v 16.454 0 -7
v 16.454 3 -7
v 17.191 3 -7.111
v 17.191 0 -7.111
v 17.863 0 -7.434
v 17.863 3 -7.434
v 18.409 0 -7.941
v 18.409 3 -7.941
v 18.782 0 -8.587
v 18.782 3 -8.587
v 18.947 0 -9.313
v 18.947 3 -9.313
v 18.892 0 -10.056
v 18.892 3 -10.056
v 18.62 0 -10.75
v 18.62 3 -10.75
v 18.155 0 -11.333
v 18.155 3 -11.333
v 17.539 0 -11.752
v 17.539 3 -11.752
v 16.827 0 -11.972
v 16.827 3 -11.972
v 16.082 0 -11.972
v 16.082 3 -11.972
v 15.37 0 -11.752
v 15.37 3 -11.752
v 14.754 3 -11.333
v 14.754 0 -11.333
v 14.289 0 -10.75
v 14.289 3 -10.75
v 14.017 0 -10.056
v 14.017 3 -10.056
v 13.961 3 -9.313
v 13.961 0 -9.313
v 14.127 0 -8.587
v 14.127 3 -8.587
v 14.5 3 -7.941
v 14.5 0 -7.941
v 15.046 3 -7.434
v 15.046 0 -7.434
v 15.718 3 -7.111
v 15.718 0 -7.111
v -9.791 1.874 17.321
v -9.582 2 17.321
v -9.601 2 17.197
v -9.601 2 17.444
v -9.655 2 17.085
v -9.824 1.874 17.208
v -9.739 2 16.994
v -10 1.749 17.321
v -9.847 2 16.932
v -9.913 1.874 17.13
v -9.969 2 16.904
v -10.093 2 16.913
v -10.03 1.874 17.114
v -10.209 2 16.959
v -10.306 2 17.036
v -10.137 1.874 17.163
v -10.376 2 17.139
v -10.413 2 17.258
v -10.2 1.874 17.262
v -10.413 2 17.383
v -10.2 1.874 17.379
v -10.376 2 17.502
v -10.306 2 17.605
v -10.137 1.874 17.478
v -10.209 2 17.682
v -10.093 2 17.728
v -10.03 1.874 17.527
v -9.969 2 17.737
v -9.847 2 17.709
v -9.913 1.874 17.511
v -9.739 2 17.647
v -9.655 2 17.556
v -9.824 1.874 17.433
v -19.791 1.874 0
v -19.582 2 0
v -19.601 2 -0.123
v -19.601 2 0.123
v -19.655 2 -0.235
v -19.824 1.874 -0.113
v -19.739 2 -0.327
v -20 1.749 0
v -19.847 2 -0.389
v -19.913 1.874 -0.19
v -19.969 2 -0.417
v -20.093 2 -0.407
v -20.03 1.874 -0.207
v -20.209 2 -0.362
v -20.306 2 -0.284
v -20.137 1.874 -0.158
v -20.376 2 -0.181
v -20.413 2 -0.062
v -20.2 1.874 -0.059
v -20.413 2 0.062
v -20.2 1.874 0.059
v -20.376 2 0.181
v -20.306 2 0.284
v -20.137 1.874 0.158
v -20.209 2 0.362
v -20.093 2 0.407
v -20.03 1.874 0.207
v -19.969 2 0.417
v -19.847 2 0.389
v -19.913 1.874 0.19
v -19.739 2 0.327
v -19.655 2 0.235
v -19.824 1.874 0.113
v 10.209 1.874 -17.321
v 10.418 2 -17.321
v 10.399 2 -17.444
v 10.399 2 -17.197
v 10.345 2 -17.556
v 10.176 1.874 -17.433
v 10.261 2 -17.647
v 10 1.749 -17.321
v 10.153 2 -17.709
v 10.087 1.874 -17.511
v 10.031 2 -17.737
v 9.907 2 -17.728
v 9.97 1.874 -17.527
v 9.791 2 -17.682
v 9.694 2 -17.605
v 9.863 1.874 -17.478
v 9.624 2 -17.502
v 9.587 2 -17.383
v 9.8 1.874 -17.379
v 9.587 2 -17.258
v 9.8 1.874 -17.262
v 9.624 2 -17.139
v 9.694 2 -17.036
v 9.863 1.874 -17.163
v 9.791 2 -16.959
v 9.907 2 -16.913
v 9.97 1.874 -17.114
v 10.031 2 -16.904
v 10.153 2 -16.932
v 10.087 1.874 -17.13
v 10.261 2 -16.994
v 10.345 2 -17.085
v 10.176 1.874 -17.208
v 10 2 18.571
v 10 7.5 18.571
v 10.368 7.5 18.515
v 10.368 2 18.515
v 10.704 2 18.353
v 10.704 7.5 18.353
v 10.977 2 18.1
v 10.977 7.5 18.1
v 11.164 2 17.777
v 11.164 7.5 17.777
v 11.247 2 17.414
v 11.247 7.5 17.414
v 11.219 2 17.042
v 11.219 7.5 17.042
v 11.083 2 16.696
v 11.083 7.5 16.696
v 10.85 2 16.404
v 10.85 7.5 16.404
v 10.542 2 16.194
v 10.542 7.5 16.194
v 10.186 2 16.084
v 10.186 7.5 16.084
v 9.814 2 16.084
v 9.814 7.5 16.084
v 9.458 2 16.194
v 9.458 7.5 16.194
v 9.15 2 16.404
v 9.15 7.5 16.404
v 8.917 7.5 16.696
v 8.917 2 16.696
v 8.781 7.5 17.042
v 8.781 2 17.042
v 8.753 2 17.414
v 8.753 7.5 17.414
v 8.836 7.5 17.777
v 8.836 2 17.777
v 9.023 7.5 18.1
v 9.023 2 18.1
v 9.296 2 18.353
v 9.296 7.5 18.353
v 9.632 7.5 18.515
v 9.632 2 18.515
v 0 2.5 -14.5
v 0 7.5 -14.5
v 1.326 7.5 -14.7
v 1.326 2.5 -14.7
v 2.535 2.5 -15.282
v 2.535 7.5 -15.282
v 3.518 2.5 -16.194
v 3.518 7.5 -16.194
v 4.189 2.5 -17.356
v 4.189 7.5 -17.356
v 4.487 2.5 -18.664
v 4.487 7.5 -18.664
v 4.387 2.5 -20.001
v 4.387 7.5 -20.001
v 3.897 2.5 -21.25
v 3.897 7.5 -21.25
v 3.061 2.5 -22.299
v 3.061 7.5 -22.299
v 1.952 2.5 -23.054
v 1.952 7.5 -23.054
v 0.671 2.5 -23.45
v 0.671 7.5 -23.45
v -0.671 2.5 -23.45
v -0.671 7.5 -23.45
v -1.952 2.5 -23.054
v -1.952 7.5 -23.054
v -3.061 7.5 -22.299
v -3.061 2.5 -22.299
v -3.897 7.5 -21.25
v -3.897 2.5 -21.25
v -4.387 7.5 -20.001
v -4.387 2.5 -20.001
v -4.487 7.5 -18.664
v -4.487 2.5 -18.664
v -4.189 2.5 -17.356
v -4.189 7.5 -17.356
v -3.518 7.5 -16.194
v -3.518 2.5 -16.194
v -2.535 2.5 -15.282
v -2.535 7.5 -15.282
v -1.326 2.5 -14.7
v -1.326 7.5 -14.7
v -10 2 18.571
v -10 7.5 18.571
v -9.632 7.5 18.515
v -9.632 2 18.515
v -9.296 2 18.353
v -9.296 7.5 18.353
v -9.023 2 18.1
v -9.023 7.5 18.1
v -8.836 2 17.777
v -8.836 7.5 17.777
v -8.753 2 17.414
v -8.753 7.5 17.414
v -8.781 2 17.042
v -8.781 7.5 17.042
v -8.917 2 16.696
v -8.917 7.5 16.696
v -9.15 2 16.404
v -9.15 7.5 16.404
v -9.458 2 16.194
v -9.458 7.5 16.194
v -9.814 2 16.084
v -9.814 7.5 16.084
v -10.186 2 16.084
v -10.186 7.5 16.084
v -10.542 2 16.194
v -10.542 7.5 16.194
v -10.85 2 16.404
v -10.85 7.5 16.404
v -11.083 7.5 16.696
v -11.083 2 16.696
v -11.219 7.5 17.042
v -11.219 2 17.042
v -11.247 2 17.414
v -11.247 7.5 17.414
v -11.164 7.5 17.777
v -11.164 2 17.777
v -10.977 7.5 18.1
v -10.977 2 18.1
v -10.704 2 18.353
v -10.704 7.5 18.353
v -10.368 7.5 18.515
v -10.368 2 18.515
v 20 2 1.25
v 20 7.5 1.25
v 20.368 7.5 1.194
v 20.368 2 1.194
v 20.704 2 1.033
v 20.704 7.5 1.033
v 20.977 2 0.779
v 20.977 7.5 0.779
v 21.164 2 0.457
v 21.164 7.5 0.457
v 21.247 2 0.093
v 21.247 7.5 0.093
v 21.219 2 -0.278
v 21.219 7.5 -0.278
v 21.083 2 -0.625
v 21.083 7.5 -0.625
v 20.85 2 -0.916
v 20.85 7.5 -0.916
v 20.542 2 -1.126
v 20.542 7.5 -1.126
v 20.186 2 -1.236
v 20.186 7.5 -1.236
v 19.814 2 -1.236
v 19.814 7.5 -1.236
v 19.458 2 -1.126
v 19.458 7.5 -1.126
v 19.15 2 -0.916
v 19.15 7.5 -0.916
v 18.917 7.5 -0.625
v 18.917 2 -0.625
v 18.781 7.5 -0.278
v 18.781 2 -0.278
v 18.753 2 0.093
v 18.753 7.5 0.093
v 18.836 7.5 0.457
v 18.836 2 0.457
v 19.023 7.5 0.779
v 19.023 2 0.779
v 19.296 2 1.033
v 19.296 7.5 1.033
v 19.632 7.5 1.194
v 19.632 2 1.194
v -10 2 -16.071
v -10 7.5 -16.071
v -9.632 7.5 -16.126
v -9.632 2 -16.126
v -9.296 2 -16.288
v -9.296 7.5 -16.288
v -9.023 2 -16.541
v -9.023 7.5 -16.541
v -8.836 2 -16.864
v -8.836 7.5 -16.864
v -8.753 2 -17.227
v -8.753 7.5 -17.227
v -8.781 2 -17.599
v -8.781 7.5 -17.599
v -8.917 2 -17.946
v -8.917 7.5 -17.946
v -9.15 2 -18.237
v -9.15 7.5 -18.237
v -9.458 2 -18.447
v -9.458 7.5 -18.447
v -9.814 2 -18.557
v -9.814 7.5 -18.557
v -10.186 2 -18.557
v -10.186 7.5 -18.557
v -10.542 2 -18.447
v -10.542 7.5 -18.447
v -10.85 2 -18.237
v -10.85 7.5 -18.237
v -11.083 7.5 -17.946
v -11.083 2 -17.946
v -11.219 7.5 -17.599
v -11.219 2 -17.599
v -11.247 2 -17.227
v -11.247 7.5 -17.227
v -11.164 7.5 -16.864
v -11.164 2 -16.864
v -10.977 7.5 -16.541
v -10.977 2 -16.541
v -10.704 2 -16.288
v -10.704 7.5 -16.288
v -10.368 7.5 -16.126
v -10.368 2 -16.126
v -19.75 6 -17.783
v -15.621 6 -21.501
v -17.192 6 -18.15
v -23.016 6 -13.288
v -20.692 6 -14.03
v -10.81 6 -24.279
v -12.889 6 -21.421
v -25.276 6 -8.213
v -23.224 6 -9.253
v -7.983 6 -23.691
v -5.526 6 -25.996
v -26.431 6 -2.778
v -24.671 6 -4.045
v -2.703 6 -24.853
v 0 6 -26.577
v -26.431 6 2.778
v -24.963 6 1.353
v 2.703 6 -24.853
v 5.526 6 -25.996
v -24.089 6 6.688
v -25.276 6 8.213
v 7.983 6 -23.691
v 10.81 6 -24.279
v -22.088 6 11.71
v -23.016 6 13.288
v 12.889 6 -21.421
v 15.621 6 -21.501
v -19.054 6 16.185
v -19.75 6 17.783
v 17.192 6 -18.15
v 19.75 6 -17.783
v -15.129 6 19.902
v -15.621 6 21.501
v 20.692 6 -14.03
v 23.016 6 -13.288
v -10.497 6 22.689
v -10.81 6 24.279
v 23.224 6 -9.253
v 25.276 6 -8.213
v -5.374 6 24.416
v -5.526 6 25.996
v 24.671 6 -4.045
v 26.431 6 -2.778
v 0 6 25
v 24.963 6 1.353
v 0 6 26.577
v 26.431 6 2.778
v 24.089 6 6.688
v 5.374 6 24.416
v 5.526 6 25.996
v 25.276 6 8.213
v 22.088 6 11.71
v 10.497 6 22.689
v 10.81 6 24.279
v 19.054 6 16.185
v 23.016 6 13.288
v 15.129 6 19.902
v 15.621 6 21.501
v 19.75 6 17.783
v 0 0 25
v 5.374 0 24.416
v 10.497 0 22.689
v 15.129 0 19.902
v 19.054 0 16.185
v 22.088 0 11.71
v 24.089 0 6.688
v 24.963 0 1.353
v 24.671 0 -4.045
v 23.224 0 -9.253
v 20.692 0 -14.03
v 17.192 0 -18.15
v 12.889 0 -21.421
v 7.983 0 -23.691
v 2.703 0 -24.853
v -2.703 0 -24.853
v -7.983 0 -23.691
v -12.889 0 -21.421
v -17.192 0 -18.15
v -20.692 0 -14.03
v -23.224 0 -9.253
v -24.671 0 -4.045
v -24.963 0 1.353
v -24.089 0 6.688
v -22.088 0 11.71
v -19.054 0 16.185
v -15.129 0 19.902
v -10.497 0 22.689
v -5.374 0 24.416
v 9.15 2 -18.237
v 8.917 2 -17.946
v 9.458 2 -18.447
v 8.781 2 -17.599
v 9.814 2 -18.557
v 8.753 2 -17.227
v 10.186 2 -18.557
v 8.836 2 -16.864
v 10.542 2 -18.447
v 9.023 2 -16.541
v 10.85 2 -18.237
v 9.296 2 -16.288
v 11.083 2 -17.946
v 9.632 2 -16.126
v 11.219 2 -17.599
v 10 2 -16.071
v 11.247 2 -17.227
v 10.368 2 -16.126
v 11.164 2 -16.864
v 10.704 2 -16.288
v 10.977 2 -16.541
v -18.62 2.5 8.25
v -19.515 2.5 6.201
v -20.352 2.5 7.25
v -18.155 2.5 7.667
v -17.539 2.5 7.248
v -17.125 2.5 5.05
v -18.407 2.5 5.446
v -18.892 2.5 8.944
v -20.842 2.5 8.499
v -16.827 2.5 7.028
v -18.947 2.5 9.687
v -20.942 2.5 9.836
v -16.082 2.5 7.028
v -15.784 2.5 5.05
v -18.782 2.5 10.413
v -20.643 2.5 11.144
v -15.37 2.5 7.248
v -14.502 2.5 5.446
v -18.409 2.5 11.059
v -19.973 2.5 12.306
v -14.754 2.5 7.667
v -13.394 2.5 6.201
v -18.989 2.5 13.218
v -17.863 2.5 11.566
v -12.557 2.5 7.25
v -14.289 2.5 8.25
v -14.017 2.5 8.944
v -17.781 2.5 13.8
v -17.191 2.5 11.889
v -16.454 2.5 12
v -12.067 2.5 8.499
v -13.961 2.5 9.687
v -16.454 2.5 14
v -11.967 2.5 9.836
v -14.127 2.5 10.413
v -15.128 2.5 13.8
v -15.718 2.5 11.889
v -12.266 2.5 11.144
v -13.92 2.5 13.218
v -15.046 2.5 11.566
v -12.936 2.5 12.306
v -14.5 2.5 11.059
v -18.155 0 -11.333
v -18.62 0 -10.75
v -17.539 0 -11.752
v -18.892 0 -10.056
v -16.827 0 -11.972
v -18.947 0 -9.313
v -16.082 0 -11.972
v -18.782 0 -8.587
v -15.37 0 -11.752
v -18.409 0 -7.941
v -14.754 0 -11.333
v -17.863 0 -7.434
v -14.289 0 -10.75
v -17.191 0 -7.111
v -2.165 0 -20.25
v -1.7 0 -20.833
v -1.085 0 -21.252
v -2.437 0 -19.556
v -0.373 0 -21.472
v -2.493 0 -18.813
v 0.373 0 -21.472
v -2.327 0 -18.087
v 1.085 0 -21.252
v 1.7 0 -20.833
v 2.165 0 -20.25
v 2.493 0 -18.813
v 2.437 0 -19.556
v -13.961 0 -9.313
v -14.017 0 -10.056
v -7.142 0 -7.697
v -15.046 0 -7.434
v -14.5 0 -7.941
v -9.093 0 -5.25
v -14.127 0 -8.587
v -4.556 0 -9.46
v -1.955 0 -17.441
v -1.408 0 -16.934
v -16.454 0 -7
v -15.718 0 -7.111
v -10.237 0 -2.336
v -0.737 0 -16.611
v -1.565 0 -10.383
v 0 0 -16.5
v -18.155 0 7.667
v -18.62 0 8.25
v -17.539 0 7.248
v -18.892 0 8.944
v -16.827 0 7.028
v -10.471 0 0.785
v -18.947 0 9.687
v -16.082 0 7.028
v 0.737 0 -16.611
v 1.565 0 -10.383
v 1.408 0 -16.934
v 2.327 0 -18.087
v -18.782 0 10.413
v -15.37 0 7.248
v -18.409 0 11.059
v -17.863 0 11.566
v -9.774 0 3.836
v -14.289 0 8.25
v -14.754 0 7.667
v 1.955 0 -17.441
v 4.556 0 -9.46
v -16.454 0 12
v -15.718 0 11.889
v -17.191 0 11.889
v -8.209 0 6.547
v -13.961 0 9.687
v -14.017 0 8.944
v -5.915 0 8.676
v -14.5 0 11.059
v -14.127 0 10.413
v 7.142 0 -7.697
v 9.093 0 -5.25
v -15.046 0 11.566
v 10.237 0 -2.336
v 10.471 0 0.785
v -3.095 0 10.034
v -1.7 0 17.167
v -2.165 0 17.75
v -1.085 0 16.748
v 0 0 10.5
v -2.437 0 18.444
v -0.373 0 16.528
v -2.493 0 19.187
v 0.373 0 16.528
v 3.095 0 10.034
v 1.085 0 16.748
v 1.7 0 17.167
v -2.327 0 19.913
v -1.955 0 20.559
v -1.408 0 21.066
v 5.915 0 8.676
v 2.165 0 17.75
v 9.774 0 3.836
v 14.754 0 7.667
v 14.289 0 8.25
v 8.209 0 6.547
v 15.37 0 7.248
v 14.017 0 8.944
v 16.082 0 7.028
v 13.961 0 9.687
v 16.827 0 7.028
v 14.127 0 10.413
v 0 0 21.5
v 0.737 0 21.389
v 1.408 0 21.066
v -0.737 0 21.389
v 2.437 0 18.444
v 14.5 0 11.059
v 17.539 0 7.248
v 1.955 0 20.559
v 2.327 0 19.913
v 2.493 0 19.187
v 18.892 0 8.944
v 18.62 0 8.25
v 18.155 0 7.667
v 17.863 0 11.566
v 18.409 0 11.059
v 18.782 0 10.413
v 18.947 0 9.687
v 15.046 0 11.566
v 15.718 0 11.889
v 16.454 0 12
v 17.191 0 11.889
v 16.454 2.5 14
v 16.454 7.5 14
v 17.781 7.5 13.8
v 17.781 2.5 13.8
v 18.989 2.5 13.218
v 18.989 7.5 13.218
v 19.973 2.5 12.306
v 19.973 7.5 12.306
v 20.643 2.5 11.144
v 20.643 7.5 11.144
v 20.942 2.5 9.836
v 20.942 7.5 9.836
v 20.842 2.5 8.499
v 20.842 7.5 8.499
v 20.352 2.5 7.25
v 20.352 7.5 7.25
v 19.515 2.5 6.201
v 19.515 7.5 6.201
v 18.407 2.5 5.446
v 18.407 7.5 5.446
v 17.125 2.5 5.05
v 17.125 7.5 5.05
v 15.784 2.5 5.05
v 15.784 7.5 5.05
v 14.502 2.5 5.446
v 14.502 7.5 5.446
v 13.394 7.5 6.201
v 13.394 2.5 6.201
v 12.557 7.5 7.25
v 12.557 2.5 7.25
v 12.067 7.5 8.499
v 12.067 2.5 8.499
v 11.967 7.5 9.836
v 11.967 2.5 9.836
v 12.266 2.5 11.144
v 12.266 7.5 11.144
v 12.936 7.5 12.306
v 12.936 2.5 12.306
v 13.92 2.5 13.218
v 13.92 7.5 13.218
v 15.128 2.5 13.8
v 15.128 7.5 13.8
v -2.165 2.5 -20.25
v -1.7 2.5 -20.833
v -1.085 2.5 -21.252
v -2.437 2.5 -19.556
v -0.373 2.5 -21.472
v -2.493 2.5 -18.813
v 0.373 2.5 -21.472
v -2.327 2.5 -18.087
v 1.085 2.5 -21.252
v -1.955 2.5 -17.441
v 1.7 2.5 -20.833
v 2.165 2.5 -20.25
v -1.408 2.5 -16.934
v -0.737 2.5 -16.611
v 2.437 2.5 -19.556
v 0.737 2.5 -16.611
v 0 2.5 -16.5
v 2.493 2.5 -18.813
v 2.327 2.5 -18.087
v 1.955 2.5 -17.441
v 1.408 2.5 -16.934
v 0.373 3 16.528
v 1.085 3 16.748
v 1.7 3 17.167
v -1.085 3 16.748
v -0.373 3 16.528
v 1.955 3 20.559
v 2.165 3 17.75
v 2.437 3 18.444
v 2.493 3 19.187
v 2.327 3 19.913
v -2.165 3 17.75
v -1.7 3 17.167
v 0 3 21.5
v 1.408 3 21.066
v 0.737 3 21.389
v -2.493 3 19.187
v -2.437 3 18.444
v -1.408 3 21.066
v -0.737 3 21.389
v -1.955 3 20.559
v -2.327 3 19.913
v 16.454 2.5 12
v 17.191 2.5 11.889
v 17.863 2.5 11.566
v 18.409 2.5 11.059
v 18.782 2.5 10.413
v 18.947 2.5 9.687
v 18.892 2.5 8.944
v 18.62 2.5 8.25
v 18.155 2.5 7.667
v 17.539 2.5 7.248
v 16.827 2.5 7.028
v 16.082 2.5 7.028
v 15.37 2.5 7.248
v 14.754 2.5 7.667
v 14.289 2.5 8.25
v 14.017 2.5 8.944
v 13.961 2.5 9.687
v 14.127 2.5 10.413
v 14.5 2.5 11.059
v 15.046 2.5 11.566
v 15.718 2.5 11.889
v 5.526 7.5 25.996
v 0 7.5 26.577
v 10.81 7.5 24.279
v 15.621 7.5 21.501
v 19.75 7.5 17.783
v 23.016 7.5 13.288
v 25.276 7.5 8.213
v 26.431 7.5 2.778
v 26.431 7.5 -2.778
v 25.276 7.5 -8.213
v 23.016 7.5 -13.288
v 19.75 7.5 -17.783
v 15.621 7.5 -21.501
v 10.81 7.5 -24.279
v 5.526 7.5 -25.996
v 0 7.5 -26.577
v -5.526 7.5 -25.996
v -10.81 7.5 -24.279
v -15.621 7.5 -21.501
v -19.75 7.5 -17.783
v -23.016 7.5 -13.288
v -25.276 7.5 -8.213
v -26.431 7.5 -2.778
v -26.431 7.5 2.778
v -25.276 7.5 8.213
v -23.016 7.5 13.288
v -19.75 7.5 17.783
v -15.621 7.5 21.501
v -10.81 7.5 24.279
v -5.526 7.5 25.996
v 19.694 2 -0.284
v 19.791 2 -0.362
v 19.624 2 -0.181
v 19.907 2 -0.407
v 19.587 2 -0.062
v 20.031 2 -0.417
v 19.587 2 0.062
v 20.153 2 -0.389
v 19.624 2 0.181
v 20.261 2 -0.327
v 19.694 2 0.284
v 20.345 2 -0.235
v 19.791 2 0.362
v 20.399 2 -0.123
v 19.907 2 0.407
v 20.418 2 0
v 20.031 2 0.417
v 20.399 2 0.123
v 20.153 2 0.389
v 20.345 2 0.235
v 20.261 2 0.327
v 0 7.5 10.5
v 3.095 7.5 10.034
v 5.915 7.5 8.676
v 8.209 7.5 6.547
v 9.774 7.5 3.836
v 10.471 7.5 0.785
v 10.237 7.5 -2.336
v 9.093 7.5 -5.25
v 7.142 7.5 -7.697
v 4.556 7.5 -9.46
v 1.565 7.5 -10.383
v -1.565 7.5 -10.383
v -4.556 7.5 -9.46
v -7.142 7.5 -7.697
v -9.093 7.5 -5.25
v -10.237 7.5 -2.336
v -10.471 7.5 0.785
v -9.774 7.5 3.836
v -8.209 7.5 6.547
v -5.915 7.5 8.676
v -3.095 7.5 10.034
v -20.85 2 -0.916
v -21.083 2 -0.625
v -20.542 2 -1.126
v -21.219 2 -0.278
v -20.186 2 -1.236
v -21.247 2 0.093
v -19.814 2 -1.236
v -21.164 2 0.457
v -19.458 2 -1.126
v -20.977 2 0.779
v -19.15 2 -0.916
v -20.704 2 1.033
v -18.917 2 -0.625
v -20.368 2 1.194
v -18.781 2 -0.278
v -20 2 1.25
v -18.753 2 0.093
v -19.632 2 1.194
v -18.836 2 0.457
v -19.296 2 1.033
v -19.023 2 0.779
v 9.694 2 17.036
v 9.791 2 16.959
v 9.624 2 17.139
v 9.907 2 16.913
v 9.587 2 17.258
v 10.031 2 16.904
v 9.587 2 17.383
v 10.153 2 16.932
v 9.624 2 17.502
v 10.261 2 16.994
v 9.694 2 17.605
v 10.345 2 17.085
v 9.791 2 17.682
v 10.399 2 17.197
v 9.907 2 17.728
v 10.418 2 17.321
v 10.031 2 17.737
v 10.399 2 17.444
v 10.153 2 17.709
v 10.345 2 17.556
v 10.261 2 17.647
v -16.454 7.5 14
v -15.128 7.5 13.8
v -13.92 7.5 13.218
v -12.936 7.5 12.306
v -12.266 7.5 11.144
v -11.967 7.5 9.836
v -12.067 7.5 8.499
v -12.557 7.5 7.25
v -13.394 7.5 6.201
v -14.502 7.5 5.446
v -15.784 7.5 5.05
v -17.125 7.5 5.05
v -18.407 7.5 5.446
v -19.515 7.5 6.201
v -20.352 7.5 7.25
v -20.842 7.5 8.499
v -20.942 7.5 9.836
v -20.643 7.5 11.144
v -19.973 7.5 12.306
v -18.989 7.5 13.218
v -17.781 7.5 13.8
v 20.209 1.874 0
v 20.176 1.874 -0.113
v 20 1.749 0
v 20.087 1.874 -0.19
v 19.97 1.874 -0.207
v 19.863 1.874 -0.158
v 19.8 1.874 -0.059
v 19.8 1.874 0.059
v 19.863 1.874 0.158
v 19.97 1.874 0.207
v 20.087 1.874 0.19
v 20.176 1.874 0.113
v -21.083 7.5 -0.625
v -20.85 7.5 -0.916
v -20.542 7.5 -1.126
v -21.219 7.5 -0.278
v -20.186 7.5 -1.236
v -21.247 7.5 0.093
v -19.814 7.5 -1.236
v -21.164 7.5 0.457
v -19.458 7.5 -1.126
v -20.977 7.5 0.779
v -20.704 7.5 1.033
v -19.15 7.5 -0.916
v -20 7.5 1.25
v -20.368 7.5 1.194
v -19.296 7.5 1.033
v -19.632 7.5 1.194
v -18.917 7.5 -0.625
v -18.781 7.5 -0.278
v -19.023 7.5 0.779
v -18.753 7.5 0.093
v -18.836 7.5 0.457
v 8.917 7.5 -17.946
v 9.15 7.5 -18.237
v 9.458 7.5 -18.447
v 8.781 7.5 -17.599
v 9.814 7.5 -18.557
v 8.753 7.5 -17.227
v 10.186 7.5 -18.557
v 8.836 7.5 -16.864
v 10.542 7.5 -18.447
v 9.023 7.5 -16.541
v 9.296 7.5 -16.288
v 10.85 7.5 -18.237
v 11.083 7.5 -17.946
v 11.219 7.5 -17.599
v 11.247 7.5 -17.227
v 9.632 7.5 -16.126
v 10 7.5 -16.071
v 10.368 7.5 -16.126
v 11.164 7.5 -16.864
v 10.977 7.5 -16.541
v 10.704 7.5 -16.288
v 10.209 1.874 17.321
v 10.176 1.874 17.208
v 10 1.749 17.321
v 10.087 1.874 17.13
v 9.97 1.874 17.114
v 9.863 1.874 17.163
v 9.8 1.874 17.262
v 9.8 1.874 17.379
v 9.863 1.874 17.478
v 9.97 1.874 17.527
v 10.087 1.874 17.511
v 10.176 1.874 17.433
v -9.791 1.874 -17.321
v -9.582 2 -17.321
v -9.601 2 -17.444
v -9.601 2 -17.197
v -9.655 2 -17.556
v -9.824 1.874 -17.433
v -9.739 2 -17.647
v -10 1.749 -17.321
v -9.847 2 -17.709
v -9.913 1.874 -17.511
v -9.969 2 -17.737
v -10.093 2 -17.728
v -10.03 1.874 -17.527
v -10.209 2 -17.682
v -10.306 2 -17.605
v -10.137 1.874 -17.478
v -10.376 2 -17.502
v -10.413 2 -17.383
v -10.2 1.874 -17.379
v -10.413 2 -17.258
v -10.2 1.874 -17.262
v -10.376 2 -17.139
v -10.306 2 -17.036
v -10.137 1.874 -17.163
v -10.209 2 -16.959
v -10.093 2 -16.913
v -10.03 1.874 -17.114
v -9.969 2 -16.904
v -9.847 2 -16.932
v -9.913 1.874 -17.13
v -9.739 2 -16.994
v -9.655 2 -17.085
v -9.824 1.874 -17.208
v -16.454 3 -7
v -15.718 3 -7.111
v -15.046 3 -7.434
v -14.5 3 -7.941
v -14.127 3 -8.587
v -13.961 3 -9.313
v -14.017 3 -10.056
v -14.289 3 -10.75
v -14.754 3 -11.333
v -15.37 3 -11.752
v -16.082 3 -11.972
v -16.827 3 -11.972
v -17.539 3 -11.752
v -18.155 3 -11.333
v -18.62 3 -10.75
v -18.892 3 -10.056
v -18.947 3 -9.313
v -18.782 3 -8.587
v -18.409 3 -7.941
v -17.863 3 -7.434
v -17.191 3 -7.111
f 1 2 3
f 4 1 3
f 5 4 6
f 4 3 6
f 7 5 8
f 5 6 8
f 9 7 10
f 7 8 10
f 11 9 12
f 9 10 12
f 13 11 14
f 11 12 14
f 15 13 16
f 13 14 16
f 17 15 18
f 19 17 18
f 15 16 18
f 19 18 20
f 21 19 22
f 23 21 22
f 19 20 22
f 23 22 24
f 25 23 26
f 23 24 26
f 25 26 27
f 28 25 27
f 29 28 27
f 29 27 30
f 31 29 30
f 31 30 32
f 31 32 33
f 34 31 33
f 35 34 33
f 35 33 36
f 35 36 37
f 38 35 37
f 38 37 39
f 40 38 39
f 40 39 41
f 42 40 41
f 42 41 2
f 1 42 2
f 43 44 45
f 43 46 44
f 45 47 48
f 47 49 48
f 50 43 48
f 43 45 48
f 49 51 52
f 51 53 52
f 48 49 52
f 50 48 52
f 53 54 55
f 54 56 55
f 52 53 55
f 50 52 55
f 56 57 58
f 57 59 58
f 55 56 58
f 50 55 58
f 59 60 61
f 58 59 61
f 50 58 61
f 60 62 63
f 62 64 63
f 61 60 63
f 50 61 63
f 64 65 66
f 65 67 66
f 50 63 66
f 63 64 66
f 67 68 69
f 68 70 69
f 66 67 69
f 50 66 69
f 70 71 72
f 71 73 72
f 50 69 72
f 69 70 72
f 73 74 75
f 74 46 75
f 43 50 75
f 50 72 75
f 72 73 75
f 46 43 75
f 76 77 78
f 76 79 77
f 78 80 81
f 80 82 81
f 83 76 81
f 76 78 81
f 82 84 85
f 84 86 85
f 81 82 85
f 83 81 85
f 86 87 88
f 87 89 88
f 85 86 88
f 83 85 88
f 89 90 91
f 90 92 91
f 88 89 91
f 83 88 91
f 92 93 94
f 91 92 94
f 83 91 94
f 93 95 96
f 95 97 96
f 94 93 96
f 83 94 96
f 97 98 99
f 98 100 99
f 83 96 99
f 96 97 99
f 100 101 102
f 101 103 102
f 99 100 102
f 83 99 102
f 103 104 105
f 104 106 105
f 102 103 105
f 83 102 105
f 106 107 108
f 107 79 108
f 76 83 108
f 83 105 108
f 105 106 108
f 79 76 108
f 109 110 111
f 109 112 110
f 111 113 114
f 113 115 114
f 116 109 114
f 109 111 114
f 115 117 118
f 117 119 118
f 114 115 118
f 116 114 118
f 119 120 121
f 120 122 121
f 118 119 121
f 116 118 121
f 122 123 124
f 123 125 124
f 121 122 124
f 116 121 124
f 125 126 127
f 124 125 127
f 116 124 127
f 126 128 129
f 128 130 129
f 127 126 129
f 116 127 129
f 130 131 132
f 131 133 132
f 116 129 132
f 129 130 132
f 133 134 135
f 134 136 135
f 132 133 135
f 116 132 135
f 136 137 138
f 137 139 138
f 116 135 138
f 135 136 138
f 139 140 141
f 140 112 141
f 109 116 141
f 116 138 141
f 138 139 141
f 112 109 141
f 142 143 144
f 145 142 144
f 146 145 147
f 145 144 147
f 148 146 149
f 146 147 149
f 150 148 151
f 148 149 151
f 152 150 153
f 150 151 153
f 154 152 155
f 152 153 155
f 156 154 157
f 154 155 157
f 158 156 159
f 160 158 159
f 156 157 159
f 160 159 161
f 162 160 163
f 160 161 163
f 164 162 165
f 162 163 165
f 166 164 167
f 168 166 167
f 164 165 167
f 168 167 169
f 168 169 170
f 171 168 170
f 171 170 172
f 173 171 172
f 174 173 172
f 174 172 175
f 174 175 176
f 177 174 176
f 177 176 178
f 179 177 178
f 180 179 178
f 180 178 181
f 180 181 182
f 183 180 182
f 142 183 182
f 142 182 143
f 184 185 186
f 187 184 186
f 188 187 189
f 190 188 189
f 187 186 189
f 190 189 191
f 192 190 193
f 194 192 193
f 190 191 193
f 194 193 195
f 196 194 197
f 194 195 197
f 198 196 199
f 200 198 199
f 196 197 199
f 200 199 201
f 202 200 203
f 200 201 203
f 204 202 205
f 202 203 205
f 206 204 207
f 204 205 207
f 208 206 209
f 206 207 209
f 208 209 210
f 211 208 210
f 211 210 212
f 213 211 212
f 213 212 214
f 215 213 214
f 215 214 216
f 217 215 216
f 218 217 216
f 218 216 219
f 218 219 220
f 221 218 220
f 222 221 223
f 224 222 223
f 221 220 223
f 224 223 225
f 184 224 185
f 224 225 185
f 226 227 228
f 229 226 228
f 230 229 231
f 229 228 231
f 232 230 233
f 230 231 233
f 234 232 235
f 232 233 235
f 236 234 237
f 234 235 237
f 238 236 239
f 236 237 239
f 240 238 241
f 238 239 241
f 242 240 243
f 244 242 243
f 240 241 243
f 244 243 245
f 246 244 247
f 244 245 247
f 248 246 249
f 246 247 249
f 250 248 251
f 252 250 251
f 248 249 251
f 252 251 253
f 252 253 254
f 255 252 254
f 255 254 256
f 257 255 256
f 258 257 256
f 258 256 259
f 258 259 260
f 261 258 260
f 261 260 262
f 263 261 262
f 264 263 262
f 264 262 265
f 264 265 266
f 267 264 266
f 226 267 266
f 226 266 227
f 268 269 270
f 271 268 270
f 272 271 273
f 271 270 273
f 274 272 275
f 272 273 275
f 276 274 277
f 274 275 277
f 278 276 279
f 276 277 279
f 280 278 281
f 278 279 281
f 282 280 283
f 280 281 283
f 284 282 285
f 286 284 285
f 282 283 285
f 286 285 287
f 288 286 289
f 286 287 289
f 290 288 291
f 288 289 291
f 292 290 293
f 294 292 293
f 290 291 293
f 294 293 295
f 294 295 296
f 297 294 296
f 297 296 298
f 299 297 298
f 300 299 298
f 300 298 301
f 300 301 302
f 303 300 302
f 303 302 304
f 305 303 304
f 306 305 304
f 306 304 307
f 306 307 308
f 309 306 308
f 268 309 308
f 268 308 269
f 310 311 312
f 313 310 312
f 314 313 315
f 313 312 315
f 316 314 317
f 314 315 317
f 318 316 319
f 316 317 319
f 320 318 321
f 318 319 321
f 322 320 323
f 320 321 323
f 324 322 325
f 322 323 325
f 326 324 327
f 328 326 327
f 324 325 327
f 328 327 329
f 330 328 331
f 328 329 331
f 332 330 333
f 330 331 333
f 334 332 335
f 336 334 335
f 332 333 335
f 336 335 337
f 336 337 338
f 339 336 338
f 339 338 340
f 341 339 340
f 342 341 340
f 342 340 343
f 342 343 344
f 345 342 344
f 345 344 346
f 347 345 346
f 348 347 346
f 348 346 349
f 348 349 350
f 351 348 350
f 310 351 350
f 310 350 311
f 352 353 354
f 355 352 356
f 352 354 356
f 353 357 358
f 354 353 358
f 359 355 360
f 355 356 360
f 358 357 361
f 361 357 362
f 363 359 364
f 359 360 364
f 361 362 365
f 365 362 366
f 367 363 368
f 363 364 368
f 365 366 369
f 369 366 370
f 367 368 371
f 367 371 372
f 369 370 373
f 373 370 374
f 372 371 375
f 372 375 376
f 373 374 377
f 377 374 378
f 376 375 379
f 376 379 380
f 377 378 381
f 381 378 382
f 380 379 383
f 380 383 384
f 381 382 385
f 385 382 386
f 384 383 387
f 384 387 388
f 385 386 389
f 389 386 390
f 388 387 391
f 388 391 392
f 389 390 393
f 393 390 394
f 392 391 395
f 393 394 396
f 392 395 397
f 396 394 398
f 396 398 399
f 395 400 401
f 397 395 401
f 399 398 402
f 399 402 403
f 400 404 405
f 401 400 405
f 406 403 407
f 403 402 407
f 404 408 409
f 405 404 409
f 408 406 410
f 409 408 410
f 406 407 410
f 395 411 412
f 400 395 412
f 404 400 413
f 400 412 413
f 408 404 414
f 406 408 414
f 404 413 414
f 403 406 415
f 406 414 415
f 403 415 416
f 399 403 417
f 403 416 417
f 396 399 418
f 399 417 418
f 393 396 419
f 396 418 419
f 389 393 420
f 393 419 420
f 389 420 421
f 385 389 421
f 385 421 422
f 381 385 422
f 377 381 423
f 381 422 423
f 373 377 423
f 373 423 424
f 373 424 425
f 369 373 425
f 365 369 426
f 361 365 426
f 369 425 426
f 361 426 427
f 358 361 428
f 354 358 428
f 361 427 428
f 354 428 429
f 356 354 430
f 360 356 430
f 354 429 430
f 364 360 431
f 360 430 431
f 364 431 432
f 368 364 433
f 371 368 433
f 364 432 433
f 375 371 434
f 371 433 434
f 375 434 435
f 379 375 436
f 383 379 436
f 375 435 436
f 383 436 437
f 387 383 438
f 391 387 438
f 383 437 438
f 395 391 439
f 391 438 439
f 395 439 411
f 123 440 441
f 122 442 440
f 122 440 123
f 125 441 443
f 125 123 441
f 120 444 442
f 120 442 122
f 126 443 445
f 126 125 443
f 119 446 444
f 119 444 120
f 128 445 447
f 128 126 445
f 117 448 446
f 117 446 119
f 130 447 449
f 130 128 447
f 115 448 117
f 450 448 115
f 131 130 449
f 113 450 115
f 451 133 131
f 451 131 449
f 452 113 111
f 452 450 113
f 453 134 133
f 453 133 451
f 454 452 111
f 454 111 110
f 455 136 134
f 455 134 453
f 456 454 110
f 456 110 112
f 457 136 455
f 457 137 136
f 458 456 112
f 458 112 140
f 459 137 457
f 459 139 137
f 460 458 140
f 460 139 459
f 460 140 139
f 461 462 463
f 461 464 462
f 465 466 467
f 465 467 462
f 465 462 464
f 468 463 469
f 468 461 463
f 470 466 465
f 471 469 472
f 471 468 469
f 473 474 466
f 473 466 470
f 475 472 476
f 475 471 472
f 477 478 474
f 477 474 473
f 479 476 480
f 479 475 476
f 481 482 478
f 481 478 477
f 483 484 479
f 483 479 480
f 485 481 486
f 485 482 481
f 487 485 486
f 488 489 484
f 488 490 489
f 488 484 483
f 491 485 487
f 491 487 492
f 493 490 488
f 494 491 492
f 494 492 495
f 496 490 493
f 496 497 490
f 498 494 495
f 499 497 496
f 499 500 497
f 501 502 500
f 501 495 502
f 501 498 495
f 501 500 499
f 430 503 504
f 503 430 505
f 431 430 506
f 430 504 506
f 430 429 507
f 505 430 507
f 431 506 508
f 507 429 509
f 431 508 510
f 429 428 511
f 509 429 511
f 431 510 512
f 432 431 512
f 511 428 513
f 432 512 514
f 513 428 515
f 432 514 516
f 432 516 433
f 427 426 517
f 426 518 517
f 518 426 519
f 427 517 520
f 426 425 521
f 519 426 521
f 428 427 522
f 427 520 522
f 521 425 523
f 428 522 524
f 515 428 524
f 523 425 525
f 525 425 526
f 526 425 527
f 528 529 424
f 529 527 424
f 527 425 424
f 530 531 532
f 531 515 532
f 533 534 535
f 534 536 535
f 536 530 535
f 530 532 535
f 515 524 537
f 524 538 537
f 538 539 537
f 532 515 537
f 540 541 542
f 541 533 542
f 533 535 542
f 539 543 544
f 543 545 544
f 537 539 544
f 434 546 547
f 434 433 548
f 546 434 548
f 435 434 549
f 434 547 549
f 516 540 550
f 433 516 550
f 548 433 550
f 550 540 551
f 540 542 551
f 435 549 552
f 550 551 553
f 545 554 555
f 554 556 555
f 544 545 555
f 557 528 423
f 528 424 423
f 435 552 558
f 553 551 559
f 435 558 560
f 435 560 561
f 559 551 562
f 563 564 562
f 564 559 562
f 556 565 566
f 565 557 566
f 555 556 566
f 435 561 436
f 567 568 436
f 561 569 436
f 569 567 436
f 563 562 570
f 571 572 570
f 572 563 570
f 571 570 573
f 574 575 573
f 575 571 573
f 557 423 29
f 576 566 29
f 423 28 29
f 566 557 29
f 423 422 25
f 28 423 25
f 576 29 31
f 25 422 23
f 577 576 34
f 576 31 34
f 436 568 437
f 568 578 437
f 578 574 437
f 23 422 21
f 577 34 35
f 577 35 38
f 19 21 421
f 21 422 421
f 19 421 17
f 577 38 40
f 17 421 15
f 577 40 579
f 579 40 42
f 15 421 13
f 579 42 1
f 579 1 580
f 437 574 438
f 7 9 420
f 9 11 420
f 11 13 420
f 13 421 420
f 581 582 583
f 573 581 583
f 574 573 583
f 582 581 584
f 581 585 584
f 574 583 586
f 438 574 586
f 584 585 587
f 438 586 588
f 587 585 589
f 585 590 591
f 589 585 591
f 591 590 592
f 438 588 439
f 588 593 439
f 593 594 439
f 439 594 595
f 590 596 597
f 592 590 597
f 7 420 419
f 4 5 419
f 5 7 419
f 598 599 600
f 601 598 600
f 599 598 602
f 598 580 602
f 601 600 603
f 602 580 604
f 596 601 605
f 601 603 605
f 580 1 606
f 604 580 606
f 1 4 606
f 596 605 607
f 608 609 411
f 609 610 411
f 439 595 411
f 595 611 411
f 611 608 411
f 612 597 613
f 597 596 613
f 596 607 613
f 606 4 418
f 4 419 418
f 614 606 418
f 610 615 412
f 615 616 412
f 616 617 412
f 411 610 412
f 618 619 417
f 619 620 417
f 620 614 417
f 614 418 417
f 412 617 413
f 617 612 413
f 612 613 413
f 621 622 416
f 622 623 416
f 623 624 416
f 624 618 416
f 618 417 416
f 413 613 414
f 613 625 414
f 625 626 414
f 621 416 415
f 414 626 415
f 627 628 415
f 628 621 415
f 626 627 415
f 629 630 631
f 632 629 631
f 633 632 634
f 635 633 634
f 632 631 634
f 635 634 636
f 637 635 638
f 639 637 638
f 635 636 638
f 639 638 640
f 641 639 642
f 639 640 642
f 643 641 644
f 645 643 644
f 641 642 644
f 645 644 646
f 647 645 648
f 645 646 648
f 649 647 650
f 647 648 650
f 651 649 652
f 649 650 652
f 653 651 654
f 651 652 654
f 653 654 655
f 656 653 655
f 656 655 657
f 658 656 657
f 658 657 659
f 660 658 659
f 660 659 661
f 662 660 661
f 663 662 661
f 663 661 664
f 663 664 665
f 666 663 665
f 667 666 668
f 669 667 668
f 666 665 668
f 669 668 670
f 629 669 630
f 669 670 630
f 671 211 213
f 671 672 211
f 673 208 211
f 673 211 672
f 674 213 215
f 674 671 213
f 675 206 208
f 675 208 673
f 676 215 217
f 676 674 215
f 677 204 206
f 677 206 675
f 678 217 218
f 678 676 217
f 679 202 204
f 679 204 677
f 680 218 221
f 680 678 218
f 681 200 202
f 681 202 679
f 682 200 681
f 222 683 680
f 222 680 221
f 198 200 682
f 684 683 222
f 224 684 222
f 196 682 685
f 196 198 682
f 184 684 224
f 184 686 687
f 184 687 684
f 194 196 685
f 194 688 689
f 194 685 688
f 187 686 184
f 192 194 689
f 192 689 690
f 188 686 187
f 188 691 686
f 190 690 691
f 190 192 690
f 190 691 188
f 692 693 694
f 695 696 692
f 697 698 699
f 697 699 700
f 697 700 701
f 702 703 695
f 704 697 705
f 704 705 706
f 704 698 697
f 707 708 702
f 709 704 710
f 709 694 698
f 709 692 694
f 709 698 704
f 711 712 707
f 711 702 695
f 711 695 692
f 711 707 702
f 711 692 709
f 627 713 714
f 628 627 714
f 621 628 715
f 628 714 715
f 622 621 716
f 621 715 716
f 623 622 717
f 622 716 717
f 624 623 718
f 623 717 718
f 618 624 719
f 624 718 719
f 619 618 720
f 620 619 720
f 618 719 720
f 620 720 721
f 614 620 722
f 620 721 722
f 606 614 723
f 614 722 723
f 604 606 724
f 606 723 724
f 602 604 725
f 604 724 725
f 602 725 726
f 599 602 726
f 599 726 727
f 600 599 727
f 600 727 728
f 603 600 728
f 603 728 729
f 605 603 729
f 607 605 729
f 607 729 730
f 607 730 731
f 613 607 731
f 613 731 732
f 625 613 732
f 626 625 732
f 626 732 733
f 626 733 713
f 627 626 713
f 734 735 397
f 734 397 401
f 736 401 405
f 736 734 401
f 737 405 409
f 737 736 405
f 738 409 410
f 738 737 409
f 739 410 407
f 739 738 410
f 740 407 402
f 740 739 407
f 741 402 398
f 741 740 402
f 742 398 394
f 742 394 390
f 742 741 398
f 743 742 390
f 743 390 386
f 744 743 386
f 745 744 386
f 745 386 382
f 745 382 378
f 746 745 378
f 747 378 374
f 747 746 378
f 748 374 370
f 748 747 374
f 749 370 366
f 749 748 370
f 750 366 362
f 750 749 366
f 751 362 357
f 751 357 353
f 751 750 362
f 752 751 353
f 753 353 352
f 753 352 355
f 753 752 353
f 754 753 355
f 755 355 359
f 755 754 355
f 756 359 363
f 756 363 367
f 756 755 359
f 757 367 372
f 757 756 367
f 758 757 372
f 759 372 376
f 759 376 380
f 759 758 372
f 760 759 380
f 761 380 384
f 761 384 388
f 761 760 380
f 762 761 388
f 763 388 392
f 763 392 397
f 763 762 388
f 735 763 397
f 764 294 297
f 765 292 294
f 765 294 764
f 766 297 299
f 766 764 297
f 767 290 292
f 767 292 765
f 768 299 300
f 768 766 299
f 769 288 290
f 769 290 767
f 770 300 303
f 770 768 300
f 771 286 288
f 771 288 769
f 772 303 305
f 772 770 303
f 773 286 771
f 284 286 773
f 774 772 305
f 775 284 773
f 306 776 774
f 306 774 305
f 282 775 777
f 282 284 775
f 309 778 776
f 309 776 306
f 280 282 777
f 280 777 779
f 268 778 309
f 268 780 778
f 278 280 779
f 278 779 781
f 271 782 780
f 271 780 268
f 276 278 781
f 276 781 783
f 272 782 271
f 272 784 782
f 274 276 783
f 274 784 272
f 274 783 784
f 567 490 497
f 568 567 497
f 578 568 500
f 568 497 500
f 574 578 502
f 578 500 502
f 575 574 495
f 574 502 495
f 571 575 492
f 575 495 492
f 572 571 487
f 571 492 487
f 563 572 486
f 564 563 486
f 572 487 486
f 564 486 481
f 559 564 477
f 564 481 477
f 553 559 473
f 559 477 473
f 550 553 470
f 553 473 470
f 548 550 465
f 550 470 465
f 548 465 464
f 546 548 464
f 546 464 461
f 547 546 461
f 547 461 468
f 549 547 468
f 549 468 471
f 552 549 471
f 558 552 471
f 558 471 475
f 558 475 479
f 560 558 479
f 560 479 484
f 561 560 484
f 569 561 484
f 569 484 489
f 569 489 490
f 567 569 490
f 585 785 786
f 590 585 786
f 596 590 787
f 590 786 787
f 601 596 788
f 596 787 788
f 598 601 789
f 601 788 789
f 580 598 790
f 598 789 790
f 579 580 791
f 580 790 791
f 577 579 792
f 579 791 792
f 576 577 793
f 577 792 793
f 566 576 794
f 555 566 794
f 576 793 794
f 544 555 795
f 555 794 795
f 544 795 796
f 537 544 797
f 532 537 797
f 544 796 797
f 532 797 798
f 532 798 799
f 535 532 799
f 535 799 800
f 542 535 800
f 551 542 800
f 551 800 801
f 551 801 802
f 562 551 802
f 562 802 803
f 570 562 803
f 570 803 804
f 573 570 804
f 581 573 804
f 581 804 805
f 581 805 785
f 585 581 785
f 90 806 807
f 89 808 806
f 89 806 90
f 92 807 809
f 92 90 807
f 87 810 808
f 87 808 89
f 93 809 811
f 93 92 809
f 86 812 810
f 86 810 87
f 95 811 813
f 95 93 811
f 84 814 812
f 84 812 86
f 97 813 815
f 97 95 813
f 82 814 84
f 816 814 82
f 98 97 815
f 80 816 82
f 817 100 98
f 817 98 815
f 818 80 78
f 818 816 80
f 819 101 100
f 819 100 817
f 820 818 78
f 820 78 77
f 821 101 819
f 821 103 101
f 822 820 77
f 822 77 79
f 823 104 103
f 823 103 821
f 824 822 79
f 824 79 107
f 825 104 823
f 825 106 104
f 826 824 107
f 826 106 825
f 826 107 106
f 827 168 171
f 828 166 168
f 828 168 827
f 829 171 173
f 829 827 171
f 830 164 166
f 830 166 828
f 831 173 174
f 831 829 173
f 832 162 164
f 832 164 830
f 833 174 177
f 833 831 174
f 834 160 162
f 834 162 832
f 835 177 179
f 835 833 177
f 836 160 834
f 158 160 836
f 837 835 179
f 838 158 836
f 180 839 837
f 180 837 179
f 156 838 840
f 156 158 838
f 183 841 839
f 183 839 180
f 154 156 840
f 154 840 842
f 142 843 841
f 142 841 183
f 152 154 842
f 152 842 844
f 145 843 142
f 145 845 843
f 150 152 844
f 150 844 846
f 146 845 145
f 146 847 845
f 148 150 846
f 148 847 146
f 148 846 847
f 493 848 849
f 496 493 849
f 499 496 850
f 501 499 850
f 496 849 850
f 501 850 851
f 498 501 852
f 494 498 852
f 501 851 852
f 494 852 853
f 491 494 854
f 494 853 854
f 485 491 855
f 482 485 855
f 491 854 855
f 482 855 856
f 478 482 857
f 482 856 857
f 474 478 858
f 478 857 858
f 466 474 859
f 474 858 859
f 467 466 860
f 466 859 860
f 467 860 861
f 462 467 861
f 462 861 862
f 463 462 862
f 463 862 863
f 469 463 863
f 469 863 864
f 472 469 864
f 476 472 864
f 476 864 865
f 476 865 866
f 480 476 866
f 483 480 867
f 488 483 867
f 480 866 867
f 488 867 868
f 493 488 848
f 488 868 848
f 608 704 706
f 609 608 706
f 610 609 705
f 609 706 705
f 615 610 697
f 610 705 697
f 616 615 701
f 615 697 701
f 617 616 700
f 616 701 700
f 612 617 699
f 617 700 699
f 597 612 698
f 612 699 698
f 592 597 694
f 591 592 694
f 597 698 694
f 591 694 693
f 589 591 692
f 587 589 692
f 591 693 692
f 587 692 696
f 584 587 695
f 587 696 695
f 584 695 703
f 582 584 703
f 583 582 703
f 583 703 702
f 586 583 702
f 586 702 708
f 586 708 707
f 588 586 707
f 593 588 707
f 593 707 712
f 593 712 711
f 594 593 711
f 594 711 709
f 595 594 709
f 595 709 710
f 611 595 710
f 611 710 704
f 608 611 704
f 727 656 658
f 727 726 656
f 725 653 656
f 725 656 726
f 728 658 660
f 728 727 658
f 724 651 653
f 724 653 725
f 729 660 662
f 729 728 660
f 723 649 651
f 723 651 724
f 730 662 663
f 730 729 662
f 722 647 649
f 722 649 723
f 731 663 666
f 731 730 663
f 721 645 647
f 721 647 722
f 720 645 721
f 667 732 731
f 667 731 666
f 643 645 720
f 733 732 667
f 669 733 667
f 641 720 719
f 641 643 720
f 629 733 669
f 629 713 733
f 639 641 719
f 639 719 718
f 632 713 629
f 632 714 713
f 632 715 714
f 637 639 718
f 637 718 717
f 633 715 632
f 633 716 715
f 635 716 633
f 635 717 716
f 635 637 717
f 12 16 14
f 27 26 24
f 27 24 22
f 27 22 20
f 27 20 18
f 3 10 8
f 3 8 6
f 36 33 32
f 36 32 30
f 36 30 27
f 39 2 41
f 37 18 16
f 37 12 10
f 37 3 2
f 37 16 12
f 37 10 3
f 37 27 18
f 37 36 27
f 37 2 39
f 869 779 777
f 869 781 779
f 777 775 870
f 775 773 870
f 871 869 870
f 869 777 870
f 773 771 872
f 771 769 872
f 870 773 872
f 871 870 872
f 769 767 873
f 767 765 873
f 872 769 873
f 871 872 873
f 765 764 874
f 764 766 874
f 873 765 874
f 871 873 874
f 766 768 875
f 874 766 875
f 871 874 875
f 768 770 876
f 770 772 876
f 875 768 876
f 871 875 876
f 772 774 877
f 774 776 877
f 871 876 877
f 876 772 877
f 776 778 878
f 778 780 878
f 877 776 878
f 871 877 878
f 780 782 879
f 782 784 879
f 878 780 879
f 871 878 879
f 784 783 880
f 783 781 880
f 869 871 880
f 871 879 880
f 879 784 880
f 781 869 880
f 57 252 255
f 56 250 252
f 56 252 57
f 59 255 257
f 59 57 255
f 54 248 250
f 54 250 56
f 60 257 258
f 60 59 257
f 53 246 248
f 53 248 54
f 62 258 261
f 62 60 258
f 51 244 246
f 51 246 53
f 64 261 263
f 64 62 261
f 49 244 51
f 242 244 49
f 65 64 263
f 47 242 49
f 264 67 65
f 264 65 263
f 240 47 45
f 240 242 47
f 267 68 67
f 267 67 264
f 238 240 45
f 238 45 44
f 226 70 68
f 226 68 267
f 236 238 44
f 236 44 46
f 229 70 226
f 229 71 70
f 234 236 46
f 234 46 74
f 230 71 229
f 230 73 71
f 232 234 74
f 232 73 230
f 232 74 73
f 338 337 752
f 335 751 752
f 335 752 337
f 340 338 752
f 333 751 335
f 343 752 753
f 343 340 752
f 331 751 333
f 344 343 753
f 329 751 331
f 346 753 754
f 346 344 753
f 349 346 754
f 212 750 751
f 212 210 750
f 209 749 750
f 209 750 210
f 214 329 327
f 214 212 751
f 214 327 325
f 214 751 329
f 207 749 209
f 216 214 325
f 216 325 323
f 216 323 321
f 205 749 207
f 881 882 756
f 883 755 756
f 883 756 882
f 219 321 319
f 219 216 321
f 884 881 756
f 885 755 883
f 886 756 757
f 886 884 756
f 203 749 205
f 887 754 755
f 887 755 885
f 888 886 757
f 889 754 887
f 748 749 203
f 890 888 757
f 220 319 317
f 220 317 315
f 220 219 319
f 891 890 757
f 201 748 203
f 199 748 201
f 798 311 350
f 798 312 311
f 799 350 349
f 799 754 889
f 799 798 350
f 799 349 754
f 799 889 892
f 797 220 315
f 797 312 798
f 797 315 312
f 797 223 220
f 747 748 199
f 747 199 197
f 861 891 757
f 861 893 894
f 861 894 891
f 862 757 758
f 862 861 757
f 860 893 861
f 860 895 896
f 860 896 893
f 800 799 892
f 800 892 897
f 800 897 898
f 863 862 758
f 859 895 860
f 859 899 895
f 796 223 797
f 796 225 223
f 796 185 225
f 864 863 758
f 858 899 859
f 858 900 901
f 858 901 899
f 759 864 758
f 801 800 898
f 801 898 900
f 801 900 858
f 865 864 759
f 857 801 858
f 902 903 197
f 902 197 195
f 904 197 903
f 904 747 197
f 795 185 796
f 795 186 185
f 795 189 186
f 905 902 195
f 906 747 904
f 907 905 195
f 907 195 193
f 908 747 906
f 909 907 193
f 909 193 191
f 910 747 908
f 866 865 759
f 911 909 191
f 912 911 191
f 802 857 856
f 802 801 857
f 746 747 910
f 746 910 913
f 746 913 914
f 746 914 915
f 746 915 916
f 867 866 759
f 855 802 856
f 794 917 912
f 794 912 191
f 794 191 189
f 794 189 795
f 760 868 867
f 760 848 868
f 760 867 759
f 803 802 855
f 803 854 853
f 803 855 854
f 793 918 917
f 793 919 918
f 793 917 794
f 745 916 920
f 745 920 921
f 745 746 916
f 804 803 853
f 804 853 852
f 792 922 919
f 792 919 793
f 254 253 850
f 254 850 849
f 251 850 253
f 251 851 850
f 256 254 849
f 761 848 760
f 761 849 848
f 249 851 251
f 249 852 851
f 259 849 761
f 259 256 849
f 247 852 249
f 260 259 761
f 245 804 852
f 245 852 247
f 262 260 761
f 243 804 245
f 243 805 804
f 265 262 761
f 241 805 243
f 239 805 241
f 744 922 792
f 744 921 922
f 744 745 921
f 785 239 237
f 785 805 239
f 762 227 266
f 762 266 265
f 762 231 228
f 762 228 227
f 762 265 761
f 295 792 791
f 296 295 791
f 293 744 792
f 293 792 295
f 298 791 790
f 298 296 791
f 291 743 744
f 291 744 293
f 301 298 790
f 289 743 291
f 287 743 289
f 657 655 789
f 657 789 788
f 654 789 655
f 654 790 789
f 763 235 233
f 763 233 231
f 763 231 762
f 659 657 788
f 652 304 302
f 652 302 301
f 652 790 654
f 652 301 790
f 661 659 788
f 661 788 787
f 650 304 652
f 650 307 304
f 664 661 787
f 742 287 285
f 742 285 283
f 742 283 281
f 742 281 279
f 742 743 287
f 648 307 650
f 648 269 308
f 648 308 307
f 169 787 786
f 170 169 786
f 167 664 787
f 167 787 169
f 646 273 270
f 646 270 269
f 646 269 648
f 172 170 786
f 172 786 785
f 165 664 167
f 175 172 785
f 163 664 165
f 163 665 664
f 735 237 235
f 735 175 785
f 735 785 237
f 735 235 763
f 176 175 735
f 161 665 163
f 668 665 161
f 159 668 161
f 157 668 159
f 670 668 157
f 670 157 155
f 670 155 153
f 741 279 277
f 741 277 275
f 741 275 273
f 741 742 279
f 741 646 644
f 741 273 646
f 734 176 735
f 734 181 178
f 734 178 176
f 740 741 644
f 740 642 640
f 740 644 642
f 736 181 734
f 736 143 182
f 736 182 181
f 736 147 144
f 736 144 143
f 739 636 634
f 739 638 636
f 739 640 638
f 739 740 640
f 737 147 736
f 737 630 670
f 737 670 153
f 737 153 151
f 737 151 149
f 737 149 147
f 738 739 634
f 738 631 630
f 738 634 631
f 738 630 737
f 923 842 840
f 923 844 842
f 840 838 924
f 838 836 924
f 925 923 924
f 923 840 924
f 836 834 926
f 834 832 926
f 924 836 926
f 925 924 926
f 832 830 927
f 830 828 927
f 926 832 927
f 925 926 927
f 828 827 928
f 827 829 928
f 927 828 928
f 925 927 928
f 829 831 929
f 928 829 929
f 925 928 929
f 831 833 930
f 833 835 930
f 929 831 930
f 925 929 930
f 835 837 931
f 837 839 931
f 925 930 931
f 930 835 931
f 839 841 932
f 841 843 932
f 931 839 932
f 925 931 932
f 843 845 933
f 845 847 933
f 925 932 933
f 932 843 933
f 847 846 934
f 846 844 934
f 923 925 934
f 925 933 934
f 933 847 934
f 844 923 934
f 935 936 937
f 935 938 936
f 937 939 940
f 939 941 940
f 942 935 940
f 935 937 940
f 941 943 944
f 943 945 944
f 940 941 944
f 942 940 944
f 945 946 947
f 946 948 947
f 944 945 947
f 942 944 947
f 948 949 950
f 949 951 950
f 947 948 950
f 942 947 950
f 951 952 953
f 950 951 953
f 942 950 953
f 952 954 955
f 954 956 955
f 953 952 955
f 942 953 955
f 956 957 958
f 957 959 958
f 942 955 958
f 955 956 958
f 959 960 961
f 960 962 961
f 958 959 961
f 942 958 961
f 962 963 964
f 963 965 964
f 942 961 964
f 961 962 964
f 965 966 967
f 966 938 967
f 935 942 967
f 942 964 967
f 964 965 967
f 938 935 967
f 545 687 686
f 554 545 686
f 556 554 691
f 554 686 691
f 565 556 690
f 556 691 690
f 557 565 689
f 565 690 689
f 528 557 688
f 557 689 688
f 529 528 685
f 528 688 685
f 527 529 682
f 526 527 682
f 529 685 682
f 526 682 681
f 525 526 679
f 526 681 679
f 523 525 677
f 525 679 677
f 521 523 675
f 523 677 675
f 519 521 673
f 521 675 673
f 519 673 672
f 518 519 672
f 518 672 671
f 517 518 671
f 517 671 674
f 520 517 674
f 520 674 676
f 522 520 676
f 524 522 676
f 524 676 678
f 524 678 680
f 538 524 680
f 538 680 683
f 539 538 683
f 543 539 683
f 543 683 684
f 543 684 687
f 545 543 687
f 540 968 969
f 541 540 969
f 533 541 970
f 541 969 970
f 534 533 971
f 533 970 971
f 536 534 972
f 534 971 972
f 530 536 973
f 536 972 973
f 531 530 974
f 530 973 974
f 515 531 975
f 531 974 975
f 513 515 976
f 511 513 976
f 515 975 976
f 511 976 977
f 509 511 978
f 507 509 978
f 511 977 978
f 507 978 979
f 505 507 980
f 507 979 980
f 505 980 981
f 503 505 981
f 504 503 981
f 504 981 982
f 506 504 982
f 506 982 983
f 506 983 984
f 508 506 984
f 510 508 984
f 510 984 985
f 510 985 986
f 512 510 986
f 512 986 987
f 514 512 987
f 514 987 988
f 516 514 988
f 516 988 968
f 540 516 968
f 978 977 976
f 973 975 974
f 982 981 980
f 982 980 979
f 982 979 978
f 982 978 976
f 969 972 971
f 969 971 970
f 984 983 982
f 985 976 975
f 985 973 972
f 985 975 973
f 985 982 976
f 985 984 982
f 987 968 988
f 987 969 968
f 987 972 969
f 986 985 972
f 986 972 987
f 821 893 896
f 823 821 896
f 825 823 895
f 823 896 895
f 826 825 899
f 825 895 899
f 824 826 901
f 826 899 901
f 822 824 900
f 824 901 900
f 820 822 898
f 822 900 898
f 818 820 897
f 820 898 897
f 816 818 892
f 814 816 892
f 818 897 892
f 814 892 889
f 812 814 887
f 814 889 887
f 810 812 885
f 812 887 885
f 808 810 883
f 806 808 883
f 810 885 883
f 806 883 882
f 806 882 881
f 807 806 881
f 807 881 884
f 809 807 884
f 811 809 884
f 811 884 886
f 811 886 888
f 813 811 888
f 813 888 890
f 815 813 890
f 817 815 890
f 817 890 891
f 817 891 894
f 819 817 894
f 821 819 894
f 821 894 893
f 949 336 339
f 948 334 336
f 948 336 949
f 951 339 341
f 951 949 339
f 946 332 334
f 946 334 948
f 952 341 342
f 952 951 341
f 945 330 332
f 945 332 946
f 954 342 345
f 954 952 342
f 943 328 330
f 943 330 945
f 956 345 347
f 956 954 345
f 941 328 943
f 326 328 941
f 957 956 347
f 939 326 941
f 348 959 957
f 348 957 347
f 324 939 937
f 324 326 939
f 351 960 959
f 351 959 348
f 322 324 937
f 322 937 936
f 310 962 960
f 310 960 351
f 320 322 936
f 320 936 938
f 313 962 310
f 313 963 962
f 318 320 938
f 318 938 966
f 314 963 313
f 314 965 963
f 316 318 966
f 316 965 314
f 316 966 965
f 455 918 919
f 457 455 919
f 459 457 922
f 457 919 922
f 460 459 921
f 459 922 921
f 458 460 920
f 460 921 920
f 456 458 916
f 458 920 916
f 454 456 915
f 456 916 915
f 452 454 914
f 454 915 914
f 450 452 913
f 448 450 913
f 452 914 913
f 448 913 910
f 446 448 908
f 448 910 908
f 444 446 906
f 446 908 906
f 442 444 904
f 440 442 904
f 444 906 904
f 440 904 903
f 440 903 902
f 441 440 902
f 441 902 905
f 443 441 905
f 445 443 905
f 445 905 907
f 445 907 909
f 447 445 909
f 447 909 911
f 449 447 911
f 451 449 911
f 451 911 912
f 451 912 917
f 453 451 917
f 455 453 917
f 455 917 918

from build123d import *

# Parameters (mm, degrees)
SKETCH1_R                 = 25
BOSS_EXTRUDE1_DEPTH       = 6
CUT_EXTRUDE1_REACH        = 37.861
SKETCH2_R                 = 10.5
SKETCH3_R                 = 2.5
CUT_EXTRUDE2_DEPTH        = 36.860842154
SKETCH5_R                 = 1.25
CUT_EXTRUDE3_DEPTH        = 4
BOSS_EXTRUDE2_START       = 1.5
SKETCH6_R                 = 26.576681464
SKETCH6_R_2               = 10.5
SKETCH6_R_3               = 1.25
BOSS_EXTRUDE2_DEPTH       = 1.5
SKETCH7_R                 = 4.5
CUT_EXTRUDE4_DEPTH        = 5
SKETCH8_R                 = 2.5
BOSS_EXTRUDE3_DEPTH       = 3
M3X0_5_TAPPED_HOLE1_D     = 2.5
M3X0_5_TAPPED_HOLE1_DEPTH = 5
M3X0_5_TAPPED_HOLE1_TIP   = 0.751075774


with BuildPart() as part:
    # Sketch1 → Boss-Extrude1 (new body)
    with BuildSketch(Plane(origin=(0, 0, 0), x_dir=(1, 0, 0), z_dir=(0, 1, 0))):
        Circle(SKETCH1_R)
    extrude(amount=BOSS_EXTRUDE1_DEPTH)

    # Sketch2 → Cut-Extrude1 (cut, up to next)
    with BuildSketch(Plane(origin=(0, 6, 0), x_dir=(1, 0, 0), z_dir=(0, 1, 0)), mode=Mode.PRIVATE) as cut_extrude1_sk1:
        Circle(SKETCH2_R)
    cut_extrude1_tool1 = extrude(cut_extrude1_sk1.sketch, amount=-CUT_EXTRUDE1_REACH, mode=Mode.PRIVATE) & part.part
    add(cut_extrude1_tool1.solids().sort_by_distance((0, 6, 0))[0], mode=Mode.SUBTRACT)

    # Sketch3 → Cut-Extrude2 (cut, through all)
    with BuildSketch(Plane(origin=(0, 6, 0), x_dir=(1, 0, 0), z_dir=(0, 1, 0))):
        with Locations((0, 19)):
            Circle(SKETCH3_R)
        with Locations((16.454482672, 9.5)):
            Circle(SKETCH3_R)
        with Locations((16.454482672, -9.5)):
            Circle(SKETCH3_R)
        with Locations((0, -19)):
            Circle(SKETCH3_R)
        with Locations((-16.454482672, -9.5)):
            Circle(SKETCH3_R)
        with Locations((-16.454482672, 9.5)):
            Circle(SKETCH3_R)
    extrude(amount=-CUT_EXTRUDE2_DEPTH, mode=Mode.SUBTRACT)

    # Sketch5 → Cut-Extrude3 (cut)
    with BuildSketch(Plane(origin=(0, 6, 0), x_dir=(1, 0, 0), z_dir=(0, 1, 0))):
        with Locations((20, 0)):
            Circle(SKETCH5_R)
        with Locations((10, -17.320508076)):
            Circle(SKETCH5_R)
        with Locations((-10, -17.320508076)):
            Circle(SKETCH5_R)
        with Locations((-20, 0)):
            Circle(SKETCH5_R)
        with Locations((-10, 17.320508076)):
            Circle(SKETCH5_R)
        with Locations((10, 17.320508076)):
            Circle(SKETCH5_R)
    extrude(amount=-CUT_EXTRUDE3_DEPTH, mode=Mode.SUBTRACT)

    # Sketch6 → Boss-Extrude2 (add)
    with BuildSketch(Plane(origin=(0, 6, 0), x_dir=(1, 0, 0), z_dir=(0, 1, 0)).offset(BOSS_EXTRUDE2_START)):
        Circle(SKETCH6_R)
        Circle(SKETCH6_R_2, mode=Mode.SUBTRACT)
        with Locations((10, -17.320508076)):
            Circle(SKETCH6_R_3, mode=Mode.SUBTRACT)
        with Locations((-10, -17.320508076)):
            Circle(SKETCH6_R_3, mode=Mode.SUBTRACT)
        with Locations((-20, 0)):
            Circle(SKETCH6_R_3, mode=Mode.SUBTRACT)
        with Locations((-10, 17.320508076)):
            Circle(SKETCH6_R_3, mode=Mode.SUBTRACT)
        with Locations((10, 17.320508076)):
            Circle(SKETCH6_R_3, mode=Mode.SUBTRACT)
        with Locations((20, 0)):
            Circle(SKETCH6_R_3, mode=Mode.SUBTRACT)
    extrude(amount=-BOSS_EXTRUDE2_DEPTH)

    # Sketch7 → Cut-Extrude4 (cut)
    with BuildSketch(Plane(origin=(0, 7.5, 0), x_dir=(1, 0, 0), z_dir=(0, 1, 0))):
        with Locations((16.454482672, -9.5)):
            Circle(SKETCH7_R)
        with Locations((-16.454482672, -9.5)):
            Circle(SKETCH7_R)
        with Locations((0, 19)):
            Circle(SKETCH7_R)
    extrude(amount=-CUT_EXTRUDE4_DEPTH, mode=Mode.SUBTRACT)

    # Sketch8 → Boss-Extrude3 (add)
    with BuildSketch(Plane.XZ.offset(-6)):
        with Locations((0, 19)):
            Circle(SKETCH8_R)
        with Locations((16.454482672, -9.5)):
            Circle(SKETCH8_R)
        with Locations((-16.454482672, -9.5)):
            Circle(SKETCH8_R)
    extrude(amount=BOSS_EXTRUDE3_DEPTH)

    # M3x0.5 Tapped Hole1
    with Locations(Plane(origin=(0, 7.5, 0), x_dir=(1, 0, 0), z_dir=(0, 1, 0))):
        with Locations((-10, 17.320508076), (-20, 0), (-10, -17.320508076), (10, 17.320508076), (20, 0), (10, -17.320508076)):
            Hole(M3X0_5_TAPPED_HOLE1_D / 2, depth=M3X0_5_TAPPED_HOLE1_DEPTH)
            with Locations((0, 0, -(M3X0_5_TAPPED_HOLE1_DEPTH + M3X0_5_TAPPED_HOLE1_TIP / 2))):  # 118° drill point
                Cone(0, M3X0_5_TAPPED_HOLE1_D / 2, M3X0_5_TAPPED_HOLE1_TIP, mode=Mode.SUBTRACT)


solid = part.part
